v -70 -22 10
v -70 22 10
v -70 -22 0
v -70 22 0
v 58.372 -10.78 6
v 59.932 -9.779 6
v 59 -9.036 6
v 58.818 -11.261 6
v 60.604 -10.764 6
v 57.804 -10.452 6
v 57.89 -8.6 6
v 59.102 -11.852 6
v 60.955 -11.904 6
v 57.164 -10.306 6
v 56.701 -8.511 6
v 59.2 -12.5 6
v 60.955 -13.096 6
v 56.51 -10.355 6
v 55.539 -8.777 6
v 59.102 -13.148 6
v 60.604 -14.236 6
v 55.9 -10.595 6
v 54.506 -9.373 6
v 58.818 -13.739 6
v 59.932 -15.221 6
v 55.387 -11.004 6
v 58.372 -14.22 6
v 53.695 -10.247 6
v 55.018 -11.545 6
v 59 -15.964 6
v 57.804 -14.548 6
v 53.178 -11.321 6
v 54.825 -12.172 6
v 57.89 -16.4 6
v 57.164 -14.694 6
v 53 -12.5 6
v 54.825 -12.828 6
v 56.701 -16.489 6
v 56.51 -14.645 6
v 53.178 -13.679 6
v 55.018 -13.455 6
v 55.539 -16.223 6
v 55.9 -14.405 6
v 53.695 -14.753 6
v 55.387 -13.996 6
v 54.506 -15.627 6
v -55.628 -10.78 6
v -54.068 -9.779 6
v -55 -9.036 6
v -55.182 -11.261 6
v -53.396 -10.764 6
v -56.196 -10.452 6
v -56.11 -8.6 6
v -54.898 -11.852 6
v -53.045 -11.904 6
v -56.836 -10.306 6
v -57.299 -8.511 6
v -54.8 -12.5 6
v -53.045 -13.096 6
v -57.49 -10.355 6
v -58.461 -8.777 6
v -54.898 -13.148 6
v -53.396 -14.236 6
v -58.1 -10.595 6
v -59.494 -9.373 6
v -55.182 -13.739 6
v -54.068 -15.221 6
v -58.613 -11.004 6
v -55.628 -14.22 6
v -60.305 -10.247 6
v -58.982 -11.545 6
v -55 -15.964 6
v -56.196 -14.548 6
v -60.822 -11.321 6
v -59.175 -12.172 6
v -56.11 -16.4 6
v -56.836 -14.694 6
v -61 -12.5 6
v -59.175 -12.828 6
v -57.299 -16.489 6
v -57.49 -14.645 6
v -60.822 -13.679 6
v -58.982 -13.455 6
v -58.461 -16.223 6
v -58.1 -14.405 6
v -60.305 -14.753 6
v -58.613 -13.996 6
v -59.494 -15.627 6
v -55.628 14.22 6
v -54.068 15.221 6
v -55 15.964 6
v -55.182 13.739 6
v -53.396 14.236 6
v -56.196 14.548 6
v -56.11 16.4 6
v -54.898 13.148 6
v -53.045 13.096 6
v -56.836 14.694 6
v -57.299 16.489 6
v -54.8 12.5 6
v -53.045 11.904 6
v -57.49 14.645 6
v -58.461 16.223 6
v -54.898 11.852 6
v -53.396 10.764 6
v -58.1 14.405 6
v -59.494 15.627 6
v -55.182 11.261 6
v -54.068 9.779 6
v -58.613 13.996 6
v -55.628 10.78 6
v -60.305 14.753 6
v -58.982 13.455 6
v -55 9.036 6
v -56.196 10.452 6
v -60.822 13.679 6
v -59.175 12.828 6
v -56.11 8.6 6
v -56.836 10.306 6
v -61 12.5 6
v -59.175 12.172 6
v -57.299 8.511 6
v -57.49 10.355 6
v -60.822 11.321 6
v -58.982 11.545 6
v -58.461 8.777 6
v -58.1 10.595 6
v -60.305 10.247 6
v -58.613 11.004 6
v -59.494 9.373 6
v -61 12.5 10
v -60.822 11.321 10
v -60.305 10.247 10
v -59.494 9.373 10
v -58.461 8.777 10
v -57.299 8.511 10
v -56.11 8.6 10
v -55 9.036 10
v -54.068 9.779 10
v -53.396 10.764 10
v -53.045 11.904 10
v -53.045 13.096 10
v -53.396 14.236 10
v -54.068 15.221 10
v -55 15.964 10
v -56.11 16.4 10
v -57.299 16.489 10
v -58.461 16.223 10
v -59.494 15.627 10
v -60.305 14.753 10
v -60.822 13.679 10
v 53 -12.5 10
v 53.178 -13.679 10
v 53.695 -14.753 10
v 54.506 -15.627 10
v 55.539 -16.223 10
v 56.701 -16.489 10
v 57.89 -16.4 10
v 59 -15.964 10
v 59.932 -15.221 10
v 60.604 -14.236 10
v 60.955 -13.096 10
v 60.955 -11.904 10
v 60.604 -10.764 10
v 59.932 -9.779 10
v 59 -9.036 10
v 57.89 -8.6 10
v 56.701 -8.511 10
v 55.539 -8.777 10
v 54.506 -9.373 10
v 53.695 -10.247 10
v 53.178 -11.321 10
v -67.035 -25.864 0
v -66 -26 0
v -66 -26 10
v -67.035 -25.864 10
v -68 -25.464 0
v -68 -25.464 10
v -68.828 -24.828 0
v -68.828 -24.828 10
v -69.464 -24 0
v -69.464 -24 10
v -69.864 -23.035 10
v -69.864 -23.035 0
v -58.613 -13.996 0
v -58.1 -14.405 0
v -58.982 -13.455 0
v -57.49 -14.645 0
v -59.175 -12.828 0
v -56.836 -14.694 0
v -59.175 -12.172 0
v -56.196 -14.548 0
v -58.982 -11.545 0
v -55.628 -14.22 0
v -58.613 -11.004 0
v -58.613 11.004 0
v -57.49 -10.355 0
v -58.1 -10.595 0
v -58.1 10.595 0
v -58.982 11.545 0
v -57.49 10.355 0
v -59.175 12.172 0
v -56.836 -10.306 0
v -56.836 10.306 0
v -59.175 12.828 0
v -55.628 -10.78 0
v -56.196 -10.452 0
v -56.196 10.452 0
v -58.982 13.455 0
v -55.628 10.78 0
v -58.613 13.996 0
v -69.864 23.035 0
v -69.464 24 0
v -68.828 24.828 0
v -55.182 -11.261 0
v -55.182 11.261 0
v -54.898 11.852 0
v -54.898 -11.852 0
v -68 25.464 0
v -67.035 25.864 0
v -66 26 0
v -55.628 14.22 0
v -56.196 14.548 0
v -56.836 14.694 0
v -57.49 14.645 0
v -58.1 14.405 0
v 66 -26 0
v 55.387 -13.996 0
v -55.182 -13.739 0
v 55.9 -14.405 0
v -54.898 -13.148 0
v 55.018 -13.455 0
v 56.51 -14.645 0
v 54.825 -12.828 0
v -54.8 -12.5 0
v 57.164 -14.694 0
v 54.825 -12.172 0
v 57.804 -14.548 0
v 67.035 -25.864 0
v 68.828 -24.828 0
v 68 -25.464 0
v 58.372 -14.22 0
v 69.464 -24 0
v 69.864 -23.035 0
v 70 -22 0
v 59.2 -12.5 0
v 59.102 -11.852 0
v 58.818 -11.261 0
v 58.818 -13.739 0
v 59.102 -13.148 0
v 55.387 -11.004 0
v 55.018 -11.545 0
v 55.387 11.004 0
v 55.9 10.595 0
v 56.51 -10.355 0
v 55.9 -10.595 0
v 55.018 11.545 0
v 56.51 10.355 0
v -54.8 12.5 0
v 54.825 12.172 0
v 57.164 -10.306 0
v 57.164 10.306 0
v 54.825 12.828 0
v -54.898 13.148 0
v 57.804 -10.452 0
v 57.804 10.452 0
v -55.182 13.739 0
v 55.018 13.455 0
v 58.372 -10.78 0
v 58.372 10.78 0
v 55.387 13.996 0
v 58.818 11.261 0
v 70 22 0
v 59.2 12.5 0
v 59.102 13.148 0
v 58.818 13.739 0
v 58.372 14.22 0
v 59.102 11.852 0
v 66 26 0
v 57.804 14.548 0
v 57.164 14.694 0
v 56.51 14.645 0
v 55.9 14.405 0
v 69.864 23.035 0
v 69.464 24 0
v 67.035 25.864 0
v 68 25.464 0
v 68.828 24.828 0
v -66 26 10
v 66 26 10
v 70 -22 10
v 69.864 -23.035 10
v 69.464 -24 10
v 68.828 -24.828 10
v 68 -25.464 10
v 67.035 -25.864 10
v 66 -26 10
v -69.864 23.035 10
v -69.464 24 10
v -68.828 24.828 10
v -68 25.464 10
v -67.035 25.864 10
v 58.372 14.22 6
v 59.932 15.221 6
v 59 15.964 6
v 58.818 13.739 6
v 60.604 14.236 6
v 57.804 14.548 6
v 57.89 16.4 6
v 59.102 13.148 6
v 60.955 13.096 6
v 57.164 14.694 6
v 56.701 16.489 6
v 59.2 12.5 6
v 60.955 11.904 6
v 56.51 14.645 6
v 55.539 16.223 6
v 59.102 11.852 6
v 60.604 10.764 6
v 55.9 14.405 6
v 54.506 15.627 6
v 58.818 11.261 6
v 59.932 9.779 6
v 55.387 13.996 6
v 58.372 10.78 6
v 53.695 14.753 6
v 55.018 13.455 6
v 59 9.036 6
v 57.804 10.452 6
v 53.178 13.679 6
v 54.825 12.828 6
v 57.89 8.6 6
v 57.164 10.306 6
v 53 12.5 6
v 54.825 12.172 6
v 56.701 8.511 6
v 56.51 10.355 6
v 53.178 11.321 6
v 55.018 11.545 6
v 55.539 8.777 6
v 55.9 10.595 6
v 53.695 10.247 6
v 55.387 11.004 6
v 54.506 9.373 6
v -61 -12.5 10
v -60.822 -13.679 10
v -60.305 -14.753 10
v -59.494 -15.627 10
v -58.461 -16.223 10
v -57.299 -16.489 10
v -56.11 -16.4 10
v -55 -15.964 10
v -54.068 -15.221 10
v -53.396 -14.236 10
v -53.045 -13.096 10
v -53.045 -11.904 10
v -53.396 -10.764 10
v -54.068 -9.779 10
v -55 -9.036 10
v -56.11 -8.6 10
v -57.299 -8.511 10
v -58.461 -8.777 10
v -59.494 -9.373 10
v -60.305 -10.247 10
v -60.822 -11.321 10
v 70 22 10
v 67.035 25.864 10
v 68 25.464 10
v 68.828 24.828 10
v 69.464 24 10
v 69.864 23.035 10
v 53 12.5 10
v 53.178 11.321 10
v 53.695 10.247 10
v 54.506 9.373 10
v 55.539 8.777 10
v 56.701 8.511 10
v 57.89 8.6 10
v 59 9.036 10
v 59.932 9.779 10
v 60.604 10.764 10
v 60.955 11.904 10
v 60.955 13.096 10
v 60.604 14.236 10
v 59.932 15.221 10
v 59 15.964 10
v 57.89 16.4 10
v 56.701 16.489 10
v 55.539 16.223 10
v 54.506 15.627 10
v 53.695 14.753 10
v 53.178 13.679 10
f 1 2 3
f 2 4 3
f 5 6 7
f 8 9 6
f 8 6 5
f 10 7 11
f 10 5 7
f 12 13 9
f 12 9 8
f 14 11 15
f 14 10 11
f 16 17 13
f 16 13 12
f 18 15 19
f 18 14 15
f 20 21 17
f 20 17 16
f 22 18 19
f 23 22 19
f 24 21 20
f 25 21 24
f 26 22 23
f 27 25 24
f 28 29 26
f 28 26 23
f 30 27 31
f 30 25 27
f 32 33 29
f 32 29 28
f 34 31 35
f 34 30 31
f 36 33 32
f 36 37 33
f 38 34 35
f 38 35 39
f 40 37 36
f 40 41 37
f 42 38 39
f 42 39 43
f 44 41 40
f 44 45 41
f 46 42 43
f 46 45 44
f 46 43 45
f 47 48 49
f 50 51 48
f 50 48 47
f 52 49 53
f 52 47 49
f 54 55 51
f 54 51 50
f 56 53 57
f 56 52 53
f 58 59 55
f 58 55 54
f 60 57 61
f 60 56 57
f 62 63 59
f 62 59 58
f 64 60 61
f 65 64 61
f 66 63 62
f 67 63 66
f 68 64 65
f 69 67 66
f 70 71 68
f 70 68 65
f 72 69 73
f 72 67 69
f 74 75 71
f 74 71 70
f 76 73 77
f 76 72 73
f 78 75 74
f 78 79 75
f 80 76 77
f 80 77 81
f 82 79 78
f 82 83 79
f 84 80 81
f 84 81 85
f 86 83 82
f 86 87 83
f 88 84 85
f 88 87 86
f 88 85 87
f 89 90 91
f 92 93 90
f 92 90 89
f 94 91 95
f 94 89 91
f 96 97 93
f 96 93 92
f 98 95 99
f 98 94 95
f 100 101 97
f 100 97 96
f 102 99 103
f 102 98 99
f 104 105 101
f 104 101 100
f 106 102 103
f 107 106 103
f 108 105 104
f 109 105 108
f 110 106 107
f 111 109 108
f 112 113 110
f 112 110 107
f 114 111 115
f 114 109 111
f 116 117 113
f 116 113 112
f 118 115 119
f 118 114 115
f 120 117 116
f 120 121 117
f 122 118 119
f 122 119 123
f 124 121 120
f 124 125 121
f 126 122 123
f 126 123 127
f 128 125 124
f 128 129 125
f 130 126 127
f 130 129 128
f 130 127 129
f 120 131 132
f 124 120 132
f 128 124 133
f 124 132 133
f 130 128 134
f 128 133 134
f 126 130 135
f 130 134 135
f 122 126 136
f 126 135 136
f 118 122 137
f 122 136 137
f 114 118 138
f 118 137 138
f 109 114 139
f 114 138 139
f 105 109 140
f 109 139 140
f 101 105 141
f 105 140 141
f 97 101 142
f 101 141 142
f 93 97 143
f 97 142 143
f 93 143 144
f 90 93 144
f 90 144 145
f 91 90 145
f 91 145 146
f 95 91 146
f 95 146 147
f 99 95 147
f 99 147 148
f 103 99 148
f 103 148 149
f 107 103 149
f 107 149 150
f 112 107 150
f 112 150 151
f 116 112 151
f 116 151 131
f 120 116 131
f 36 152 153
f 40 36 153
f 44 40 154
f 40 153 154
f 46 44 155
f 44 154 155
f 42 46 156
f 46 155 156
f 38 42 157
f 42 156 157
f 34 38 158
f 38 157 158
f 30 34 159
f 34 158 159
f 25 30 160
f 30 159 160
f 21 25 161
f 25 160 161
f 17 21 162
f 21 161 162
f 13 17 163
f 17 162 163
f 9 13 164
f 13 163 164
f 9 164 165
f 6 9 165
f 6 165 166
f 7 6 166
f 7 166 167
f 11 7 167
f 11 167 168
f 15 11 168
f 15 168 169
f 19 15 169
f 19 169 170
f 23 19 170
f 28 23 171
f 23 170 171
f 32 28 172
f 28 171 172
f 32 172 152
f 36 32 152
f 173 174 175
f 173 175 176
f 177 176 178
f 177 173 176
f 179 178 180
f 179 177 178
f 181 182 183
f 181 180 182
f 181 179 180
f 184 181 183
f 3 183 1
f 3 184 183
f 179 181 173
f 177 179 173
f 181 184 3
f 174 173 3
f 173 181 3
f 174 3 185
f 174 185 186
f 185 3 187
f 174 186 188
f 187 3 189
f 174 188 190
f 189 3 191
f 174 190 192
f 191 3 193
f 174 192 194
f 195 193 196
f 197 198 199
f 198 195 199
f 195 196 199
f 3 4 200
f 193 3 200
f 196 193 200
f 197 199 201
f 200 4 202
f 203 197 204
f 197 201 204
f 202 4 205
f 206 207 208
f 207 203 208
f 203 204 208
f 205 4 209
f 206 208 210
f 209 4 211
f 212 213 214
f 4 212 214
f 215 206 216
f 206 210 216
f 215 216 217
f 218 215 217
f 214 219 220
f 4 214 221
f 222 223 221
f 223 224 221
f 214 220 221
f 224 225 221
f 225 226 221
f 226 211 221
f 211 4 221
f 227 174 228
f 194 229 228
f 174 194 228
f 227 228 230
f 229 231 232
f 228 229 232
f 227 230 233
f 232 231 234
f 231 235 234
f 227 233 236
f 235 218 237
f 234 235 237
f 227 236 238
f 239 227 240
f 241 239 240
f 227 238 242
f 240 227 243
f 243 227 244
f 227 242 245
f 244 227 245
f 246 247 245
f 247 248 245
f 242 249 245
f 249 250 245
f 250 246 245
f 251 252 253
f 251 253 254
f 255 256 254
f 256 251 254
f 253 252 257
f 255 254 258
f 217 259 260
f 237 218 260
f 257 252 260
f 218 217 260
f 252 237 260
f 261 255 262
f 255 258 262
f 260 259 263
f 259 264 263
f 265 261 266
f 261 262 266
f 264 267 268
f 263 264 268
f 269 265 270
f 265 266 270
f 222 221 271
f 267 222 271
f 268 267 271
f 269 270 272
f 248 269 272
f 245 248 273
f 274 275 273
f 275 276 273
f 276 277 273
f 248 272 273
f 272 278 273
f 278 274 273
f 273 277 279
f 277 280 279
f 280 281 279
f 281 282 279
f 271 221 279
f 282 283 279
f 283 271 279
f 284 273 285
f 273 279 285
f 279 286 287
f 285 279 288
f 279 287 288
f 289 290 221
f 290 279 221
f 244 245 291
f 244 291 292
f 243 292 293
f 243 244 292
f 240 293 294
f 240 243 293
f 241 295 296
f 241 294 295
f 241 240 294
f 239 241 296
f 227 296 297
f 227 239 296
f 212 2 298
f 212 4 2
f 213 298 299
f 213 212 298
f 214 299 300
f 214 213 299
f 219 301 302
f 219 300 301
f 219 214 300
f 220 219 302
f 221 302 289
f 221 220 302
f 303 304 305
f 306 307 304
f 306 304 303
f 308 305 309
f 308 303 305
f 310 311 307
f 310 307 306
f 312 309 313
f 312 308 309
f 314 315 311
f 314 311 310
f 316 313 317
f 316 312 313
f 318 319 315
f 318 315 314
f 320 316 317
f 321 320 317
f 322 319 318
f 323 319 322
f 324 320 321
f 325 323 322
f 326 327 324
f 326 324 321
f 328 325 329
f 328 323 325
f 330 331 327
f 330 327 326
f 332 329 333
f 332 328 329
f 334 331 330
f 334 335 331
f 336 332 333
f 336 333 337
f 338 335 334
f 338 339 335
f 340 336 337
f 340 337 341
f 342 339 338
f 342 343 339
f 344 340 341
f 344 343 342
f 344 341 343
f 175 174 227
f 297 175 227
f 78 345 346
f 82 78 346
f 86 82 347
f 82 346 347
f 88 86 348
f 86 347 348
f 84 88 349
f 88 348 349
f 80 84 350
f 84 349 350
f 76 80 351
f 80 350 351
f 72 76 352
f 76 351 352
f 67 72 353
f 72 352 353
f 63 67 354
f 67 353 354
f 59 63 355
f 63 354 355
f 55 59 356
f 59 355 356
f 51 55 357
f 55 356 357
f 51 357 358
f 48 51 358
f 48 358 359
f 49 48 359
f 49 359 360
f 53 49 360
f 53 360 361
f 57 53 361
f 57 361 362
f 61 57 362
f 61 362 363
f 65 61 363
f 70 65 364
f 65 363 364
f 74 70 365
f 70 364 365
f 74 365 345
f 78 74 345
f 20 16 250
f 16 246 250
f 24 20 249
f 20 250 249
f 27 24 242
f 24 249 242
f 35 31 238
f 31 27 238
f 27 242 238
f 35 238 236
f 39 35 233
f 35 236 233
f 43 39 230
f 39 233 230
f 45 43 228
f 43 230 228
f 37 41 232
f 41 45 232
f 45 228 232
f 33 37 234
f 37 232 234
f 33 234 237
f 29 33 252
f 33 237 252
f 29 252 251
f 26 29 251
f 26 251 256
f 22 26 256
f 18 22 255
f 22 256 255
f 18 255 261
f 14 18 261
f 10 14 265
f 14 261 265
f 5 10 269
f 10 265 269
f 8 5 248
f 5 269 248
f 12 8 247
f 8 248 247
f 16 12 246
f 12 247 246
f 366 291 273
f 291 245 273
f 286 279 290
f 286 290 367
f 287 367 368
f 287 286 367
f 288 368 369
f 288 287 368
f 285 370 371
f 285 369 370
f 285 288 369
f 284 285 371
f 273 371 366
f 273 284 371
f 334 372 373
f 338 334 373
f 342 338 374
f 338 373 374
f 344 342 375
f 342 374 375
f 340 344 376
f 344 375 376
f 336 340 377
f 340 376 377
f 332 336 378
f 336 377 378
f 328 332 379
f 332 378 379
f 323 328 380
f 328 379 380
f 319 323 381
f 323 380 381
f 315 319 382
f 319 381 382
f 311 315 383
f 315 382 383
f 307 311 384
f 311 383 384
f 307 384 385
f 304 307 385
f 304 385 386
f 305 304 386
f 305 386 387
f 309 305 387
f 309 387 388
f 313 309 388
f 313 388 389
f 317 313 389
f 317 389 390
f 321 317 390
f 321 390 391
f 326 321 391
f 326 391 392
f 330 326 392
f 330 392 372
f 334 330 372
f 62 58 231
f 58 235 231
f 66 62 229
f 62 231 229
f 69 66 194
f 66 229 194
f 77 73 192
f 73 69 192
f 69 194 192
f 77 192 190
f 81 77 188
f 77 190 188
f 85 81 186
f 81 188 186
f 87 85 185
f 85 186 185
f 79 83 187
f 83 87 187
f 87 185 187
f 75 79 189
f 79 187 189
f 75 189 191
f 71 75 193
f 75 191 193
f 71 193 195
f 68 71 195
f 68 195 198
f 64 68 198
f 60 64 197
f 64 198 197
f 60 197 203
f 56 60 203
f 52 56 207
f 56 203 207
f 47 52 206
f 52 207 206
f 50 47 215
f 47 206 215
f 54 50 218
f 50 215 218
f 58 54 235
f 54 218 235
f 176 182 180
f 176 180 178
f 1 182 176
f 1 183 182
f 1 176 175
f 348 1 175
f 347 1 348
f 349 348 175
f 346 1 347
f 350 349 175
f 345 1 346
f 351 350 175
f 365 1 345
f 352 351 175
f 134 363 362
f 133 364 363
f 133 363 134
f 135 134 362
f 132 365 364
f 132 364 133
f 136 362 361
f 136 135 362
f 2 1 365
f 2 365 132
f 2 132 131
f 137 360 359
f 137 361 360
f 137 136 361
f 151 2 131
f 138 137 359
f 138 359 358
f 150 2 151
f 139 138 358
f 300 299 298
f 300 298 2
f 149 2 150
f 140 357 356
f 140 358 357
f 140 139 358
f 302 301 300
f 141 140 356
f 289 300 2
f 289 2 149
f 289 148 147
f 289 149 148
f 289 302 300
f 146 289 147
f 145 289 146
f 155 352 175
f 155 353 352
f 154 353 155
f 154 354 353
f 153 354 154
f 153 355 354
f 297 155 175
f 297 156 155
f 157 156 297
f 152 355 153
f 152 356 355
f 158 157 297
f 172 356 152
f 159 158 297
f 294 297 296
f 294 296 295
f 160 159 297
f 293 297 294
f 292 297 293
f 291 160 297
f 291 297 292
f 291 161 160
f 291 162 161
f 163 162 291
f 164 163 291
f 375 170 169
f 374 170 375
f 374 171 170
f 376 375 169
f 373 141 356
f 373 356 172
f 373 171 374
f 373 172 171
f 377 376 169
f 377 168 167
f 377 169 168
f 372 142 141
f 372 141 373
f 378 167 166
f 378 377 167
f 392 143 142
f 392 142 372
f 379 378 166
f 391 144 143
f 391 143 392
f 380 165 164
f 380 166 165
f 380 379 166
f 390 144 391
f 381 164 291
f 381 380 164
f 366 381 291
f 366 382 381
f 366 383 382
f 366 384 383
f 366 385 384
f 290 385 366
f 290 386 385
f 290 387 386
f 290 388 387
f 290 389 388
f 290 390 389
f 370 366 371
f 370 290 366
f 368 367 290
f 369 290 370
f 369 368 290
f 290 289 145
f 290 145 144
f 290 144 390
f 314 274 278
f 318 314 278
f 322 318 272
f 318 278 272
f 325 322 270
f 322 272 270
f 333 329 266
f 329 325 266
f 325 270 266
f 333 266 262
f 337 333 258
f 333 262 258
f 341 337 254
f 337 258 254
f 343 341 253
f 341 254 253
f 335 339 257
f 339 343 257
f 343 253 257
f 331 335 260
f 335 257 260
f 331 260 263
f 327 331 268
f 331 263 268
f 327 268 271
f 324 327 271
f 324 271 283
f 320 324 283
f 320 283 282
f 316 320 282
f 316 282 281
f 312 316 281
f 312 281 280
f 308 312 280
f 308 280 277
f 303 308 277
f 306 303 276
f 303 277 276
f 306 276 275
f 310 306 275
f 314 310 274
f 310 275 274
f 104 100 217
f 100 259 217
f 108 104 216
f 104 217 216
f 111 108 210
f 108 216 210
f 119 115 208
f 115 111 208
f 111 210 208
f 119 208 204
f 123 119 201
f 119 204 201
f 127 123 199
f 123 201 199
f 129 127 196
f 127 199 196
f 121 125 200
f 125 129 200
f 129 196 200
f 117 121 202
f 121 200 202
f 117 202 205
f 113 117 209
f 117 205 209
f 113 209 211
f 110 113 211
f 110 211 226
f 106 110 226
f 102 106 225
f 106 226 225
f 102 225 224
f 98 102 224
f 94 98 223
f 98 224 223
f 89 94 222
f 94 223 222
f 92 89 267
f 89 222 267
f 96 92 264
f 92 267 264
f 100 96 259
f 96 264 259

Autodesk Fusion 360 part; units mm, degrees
sketch "Sketch1" plane through (0, 0, 0) normal (0, 0, 1) x (1, 0, 0)
  line L0 (66, 26) -> (-66, 26)
  line L1 (-70, 22) -> (-70, -22)
  line L2 (-66, -26) -> (66, -26)
  line L3 (70, -22) -> (70, 22)
  line L4 (70, 26) -> (-70, -26) construction
  line L5 (-70, 26) -> (70, -26) construction
  arc A0 (-70, -22) -> (-66, -26) centre (-66, -22) ccw
  arc A1 (-66, 26) -> (-70, 22) centre (-66, 22) ccw
  arc A2 (70, 22) -> (66, 26) centre (66, 22) ccw
  arc A3 (66, -26) -> (70, -22) centre (66, -22) ccw
  line L6 (-70, 26) -> (-57, 26) construction
  line L7 (-57, 26) -> (-57, 12.5) construction
  line L8 (-57, 12.5) -> (-70, 12.5) construction
  line L9 (-70, 12.5) -> (-70, 26) construction
  line L10 (70, 26) -> (57, 26) construction
  line L11 (57, 26) -> (57, 12.5) construction
  line L12 (57, 12.5) -> (70, 12.5) construction
  line L13 (70, 12.5) -> (70, 26) construction
  line L14 (-70, -26) -> (-57, -26) construction
  line L15 (-57, -26) -> (-57, -12.5) construction
  line L16 (-57, -12.5) -> (-70, -12.5) construction
  line L17 (-70, -12.5) -> (-70, -26) construction
  line L18 (70, -26) -> (57, -26) construction
  line L19 (57, -26) -> (57, -12.5) construction
  line L20 (57, -12.5) -> (70, -12.5) construction
  line L21 (70, -12.5) -> (70, -26) construction
  circle A4 centre (-57, 12.5) radius 2.2
  circle A5 centre (57, 12.5) radius 2.2
  circle A6 centre (-57, -12.5) radius 2.2
  circle A7 centre (57, -12.5) radius 2.2
  dimension "d1" = 140
  dimension "d2" = 52
  dimension "d3" = 4
  dimension "d4" = 13
  dimension "d5" = 13.5
  dimension "d6" = 13
  dimension "d7" = 13.5
  dimension "d8" = 13
  dimension "d9" = 13.5
  dimension "d10" = 13
  dimension "d11" = 13.5
  dimension "d12" = 4.4
  dimension "d13" = 4.4
  dimension "d14" = 4.4
  dimension "d15" = 4.4
extrude "Extrude1" add sketch "Sketch1" along normal blind 10
sketch "Sketch2" plane through (0, 0, 10) normal (0, 0, 1) x (-1, 0, 0)
  circle A0 centre (57, -12.5) radius 2.2
  circle A1 centre (-57, 12.5) radius 2.2
  circle A2 centre (57, 12.5) radius 2.2
  circle A3 centre (-57, -12.5) radius 2.2
  arc A4 (-66, 26) -> (-70, 22) centre (-66, 22) ccw
  line L0 (-70, 22) -> (-70, -22)
  arc A5 (-70, -22) -> (-66, -26) centre (-66, -22) ccw
  line L1 (-66, -26) -> (66, -26)
  arc A6 (66, -26) -> (70, -22) centre (66, -22) ccw
  line L2 (70, -22) -> (70, 22)
  arc A7 (70, 22) -> (66, 26) centre (66, 22) ccw
  line L3 (66, 26) -> (-66, 26)
  circle A8 centre (57, -12.5) radius 4
  circle A9 centre (57, 12.5) radius 4
  circle A10 centre (-57, -12.5) radius 4
  circle A11 centre (-57, 12.5) radius 4
  dimension "d18" = 8
  dimension "d19" = 8
  dimension "d20" = 8
  dimension "d21" = 8
extrude "Extrude2" cut sketch "Sketch2" against normal blind 4 contours A8 | A9 | A10 | A11
